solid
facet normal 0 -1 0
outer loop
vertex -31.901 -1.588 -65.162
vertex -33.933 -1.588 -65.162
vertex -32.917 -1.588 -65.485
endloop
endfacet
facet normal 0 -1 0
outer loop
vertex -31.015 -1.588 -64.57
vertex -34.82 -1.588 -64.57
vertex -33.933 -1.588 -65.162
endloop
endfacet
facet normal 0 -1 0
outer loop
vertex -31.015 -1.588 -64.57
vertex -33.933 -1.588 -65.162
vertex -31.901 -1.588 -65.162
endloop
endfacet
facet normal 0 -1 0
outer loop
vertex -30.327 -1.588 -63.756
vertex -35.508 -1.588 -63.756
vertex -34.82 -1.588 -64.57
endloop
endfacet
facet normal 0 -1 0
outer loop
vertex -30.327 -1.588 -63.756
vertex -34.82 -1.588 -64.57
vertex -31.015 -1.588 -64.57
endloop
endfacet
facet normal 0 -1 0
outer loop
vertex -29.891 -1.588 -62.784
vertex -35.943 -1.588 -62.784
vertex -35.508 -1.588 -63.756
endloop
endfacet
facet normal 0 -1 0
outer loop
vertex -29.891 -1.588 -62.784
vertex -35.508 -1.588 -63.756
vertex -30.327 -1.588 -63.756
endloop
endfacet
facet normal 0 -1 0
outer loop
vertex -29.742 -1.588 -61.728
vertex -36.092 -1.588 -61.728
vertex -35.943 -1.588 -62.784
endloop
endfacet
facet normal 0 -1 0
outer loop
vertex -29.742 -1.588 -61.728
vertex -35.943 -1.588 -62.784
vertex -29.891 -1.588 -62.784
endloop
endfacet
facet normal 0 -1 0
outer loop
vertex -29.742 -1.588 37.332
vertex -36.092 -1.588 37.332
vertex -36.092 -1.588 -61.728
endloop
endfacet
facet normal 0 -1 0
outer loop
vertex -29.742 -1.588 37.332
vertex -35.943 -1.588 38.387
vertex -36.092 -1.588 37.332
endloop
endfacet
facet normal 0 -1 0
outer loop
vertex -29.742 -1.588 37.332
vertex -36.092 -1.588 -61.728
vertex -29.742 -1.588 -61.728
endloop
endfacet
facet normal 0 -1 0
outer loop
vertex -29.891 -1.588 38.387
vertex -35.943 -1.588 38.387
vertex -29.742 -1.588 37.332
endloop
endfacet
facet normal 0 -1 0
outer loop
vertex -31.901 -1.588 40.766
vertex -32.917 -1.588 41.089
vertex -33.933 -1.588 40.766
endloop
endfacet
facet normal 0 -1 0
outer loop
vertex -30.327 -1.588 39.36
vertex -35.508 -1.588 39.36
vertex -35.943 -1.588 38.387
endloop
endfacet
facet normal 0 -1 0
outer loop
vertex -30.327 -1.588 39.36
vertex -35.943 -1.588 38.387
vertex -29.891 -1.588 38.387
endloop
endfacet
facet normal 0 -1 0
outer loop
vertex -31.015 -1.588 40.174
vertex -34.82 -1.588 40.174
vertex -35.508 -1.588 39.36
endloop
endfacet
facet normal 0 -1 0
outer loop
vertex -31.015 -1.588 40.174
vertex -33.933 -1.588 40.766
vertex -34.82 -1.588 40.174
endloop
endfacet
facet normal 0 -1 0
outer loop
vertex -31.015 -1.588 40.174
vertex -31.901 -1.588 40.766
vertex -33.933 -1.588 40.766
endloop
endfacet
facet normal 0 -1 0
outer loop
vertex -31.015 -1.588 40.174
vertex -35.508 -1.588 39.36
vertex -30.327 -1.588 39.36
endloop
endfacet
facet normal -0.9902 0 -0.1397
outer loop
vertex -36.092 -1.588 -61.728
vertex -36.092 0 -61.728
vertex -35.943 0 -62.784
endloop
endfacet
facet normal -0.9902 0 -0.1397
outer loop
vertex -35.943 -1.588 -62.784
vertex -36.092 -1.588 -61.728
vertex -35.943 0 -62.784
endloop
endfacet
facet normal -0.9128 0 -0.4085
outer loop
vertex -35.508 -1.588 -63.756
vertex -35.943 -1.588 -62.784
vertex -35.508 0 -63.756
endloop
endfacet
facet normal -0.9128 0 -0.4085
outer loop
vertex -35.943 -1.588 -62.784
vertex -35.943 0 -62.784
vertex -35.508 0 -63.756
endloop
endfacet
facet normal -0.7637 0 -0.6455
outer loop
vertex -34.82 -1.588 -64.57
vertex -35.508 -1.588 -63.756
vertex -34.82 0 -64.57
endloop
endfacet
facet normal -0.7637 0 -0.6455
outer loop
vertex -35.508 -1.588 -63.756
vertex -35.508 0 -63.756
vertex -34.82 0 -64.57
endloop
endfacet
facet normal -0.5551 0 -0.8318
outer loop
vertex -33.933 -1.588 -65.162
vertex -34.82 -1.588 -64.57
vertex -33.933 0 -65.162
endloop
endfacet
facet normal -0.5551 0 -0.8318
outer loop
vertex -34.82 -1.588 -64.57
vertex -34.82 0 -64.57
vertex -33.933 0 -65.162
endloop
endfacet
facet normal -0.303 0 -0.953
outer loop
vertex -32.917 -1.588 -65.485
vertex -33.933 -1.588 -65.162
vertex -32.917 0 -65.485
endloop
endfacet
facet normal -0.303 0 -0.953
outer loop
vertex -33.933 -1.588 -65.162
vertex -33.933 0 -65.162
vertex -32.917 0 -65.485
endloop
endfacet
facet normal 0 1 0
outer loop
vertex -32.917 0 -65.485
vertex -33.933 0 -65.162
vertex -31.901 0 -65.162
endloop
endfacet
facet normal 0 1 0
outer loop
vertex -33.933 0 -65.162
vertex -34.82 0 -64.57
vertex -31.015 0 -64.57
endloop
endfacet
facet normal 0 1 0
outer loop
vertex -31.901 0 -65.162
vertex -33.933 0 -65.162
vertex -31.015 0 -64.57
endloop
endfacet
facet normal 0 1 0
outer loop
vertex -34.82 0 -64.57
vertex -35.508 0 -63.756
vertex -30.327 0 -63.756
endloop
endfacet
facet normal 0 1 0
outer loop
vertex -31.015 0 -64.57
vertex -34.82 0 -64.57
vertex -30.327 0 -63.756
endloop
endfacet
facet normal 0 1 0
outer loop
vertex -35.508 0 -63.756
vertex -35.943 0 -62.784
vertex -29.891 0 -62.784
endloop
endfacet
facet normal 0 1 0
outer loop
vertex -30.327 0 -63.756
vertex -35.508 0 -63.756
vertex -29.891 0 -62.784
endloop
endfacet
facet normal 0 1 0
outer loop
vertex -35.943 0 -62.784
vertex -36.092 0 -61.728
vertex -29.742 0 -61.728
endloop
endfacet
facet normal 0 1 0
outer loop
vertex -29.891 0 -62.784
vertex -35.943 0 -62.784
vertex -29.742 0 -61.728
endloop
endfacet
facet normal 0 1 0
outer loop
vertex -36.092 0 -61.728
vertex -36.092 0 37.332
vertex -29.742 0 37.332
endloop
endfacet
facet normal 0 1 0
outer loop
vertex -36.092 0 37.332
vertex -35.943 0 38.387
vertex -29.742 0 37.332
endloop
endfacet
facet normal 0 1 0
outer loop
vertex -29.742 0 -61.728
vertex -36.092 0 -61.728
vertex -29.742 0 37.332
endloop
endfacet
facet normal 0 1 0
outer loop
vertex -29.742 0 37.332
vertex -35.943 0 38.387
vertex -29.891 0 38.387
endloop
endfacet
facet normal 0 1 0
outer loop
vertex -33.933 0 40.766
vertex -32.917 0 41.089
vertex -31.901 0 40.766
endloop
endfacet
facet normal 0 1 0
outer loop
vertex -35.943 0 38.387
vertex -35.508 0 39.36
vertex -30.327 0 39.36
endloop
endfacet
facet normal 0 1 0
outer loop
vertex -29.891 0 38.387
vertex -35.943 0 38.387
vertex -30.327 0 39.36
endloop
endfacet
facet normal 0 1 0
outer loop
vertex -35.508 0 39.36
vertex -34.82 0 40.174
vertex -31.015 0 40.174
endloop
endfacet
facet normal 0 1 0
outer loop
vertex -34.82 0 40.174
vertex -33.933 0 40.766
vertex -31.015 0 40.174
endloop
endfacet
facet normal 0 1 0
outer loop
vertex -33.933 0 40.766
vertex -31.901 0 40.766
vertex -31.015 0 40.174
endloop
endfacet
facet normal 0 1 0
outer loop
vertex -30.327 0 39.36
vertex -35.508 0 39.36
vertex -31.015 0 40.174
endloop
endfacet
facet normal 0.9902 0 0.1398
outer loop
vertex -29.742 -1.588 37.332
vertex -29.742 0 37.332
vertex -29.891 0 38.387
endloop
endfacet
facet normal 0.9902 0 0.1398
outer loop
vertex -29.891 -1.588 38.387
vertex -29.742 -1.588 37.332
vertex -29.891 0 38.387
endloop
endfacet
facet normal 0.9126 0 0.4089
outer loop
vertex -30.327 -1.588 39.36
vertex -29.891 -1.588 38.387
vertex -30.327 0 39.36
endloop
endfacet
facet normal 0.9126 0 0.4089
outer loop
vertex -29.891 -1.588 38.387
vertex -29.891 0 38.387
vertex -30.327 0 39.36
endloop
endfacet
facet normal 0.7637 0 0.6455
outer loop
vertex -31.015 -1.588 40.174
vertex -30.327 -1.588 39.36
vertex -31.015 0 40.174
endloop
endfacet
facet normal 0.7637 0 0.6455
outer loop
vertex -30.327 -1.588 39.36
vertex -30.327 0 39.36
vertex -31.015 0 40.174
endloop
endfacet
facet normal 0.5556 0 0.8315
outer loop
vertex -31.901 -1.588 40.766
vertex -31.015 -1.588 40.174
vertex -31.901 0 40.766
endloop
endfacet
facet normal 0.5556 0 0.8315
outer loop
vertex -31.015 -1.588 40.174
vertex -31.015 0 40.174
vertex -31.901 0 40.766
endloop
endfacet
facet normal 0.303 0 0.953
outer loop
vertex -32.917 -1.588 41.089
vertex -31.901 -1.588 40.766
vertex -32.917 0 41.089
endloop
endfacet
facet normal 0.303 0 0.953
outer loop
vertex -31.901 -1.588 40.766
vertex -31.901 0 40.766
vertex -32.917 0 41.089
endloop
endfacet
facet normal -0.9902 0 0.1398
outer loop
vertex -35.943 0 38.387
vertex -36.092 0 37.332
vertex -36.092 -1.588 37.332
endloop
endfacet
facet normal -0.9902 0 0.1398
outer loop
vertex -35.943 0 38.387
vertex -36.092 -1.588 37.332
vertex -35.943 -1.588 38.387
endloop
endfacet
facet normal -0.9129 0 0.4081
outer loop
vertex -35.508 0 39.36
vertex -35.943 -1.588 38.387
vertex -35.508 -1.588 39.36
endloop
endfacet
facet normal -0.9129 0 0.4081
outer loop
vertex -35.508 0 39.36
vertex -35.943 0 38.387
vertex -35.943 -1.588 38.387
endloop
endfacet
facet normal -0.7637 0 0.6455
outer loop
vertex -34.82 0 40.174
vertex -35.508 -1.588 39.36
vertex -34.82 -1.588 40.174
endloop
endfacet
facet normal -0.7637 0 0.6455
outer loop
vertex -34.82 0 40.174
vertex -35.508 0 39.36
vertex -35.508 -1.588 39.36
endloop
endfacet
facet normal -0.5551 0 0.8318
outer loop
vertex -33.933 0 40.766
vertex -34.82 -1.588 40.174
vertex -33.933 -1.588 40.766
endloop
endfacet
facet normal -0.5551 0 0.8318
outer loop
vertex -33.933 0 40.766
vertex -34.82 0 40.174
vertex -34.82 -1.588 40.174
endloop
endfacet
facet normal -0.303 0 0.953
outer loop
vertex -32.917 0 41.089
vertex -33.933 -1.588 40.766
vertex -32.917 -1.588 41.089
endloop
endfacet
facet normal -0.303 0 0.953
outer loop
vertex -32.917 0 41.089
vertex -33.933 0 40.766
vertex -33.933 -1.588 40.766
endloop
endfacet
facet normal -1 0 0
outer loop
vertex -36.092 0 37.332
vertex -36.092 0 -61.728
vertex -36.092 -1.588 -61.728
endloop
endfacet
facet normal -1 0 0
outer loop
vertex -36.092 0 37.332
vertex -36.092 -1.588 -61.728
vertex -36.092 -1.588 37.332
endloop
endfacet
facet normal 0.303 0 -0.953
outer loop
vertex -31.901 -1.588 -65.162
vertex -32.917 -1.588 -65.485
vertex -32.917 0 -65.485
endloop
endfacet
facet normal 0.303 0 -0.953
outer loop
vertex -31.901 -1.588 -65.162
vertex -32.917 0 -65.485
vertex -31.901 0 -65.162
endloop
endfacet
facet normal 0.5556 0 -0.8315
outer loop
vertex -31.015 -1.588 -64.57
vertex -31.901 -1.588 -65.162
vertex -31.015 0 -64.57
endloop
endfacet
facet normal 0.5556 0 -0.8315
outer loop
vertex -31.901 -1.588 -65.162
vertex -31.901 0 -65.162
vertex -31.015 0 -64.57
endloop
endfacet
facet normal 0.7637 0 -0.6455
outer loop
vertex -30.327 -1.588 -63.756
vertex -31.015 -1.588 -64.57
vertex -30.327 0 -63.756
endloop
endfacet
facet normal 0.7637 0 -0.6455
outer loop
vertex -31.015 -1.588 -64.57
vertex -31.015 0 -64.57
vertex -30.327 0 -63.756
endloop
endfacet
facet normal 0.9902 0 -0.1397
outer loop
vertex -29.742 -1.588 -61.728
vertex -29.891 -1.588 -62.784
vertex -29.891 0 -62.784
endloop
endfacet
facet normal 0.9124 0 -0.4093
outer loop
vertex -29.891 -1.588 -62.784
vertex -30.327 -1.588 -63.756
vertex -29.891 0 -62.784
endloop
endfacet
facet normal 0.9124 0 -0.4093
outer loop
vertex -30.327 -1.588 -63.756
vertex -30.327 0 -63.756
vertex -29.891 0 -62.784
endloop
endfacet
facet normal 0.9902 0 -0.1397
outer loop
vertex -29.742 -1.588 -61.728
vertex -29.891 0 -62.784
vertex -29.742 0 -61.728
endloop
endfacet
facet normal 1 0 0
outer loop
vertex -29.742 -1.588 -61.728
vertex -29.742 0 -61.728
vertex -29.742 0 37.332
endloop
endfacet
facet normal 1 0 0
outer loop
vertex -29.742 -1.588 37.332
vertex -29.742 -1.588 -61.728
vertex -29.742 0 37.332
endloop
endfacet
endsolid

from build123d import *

# Parameters (mm, degrees)
F0_W        = 6.35
F0_H        = 106.68
F1_DEPTH    = 1.5875
F2_T1_DEPTH = 20.6375
F3_T1_DEPTH = 20.6375


# Not quite as in the source:
# - a fillet or chamfer that OpenCascade refuses, or shapes differently, is made with other operations: its cross-section is extruded or revolved along the edge and cut away or added


with BuildPart() as f1:
    # F0 (on Front) → F1 (new body)
    with BuildSketch(Plane.XZ):
        with Locations((-32.9172081137, -12.1981453611)):
            Rectangle(F0_W, F0_H)
    extrude(amount=F1_DEPTH)

    # F2: fillet of radius 3.81 on 2 edges, made by hand

    # F2_s2 → F2_t1 (cut)
    with BuildSketch(Plane.XZ.offset(-9.525)):
        with BuildLine():
            ThreePointArc((-36.0922081137, 37.3318546389), (-34.97628495, 40.0259314752), (-32.2822081137, 41.1418546389))
            Line((-32.2822081137, 41.1418546389), (-36.0922081137, 41.1418546389))
            Line((-36.0922081137, 41.1418546389), (-36.0922081137, 37.3318546389))
        make_face()
        with BuildLine():
            ThreePointArc((-29.7422081137, 37.3318546389), (-30.8581312774, 40.0259314752), (-33.5522081137, 41.1418546389))
            Line((-33.5522081137, 41.1418546389), (-29.7422081137, 41.1418546389))
            Line((-29.7422081137, 41.1418546389), (-29.7422081137, 37.3318546389))
        make_face()
    extrude(amount=F2_T1_DEPTH, mode=Mode.SUBTRACT)

    # F3: fillet of radius 3.81 on 2 edges, made by hand

    # F3_s2 → F3_t1 (cut)
    with BuildSketch(Plane.XZ.offset(-9.525)):
        with BuildLine():
            ThreePointArc((-36.0922081137, -61.7281453611), (-34.97628495, -64.4222221974), (-32.2822081137, -65.5381453611))
            Line((-32.2822081137, -65.5381453611), (-36.0922081137, -65.5381453611))
            Line((-36.0922081137, -65.5381453611), (-36.0922081137, -61.7281453611))
        make_face()
        with BuildLine():
            ThreePointArc((-33.5522081137, -65.5381453611), (-30.8581312774, -64.4222221974), (-29.7422081137, -61.7281453611))
            Line((-29.7422081137, -61.7281453611), (-29.7422081137, -65.5381453611))
            Line((-29.7422081137, -65.5381453611), (-33.5522081137, -65.5381453611))
        make_face()
    extrude(amount=F3_T1_DEPTH, mode=Mode.SUBTRACT)


solid = f1.part
